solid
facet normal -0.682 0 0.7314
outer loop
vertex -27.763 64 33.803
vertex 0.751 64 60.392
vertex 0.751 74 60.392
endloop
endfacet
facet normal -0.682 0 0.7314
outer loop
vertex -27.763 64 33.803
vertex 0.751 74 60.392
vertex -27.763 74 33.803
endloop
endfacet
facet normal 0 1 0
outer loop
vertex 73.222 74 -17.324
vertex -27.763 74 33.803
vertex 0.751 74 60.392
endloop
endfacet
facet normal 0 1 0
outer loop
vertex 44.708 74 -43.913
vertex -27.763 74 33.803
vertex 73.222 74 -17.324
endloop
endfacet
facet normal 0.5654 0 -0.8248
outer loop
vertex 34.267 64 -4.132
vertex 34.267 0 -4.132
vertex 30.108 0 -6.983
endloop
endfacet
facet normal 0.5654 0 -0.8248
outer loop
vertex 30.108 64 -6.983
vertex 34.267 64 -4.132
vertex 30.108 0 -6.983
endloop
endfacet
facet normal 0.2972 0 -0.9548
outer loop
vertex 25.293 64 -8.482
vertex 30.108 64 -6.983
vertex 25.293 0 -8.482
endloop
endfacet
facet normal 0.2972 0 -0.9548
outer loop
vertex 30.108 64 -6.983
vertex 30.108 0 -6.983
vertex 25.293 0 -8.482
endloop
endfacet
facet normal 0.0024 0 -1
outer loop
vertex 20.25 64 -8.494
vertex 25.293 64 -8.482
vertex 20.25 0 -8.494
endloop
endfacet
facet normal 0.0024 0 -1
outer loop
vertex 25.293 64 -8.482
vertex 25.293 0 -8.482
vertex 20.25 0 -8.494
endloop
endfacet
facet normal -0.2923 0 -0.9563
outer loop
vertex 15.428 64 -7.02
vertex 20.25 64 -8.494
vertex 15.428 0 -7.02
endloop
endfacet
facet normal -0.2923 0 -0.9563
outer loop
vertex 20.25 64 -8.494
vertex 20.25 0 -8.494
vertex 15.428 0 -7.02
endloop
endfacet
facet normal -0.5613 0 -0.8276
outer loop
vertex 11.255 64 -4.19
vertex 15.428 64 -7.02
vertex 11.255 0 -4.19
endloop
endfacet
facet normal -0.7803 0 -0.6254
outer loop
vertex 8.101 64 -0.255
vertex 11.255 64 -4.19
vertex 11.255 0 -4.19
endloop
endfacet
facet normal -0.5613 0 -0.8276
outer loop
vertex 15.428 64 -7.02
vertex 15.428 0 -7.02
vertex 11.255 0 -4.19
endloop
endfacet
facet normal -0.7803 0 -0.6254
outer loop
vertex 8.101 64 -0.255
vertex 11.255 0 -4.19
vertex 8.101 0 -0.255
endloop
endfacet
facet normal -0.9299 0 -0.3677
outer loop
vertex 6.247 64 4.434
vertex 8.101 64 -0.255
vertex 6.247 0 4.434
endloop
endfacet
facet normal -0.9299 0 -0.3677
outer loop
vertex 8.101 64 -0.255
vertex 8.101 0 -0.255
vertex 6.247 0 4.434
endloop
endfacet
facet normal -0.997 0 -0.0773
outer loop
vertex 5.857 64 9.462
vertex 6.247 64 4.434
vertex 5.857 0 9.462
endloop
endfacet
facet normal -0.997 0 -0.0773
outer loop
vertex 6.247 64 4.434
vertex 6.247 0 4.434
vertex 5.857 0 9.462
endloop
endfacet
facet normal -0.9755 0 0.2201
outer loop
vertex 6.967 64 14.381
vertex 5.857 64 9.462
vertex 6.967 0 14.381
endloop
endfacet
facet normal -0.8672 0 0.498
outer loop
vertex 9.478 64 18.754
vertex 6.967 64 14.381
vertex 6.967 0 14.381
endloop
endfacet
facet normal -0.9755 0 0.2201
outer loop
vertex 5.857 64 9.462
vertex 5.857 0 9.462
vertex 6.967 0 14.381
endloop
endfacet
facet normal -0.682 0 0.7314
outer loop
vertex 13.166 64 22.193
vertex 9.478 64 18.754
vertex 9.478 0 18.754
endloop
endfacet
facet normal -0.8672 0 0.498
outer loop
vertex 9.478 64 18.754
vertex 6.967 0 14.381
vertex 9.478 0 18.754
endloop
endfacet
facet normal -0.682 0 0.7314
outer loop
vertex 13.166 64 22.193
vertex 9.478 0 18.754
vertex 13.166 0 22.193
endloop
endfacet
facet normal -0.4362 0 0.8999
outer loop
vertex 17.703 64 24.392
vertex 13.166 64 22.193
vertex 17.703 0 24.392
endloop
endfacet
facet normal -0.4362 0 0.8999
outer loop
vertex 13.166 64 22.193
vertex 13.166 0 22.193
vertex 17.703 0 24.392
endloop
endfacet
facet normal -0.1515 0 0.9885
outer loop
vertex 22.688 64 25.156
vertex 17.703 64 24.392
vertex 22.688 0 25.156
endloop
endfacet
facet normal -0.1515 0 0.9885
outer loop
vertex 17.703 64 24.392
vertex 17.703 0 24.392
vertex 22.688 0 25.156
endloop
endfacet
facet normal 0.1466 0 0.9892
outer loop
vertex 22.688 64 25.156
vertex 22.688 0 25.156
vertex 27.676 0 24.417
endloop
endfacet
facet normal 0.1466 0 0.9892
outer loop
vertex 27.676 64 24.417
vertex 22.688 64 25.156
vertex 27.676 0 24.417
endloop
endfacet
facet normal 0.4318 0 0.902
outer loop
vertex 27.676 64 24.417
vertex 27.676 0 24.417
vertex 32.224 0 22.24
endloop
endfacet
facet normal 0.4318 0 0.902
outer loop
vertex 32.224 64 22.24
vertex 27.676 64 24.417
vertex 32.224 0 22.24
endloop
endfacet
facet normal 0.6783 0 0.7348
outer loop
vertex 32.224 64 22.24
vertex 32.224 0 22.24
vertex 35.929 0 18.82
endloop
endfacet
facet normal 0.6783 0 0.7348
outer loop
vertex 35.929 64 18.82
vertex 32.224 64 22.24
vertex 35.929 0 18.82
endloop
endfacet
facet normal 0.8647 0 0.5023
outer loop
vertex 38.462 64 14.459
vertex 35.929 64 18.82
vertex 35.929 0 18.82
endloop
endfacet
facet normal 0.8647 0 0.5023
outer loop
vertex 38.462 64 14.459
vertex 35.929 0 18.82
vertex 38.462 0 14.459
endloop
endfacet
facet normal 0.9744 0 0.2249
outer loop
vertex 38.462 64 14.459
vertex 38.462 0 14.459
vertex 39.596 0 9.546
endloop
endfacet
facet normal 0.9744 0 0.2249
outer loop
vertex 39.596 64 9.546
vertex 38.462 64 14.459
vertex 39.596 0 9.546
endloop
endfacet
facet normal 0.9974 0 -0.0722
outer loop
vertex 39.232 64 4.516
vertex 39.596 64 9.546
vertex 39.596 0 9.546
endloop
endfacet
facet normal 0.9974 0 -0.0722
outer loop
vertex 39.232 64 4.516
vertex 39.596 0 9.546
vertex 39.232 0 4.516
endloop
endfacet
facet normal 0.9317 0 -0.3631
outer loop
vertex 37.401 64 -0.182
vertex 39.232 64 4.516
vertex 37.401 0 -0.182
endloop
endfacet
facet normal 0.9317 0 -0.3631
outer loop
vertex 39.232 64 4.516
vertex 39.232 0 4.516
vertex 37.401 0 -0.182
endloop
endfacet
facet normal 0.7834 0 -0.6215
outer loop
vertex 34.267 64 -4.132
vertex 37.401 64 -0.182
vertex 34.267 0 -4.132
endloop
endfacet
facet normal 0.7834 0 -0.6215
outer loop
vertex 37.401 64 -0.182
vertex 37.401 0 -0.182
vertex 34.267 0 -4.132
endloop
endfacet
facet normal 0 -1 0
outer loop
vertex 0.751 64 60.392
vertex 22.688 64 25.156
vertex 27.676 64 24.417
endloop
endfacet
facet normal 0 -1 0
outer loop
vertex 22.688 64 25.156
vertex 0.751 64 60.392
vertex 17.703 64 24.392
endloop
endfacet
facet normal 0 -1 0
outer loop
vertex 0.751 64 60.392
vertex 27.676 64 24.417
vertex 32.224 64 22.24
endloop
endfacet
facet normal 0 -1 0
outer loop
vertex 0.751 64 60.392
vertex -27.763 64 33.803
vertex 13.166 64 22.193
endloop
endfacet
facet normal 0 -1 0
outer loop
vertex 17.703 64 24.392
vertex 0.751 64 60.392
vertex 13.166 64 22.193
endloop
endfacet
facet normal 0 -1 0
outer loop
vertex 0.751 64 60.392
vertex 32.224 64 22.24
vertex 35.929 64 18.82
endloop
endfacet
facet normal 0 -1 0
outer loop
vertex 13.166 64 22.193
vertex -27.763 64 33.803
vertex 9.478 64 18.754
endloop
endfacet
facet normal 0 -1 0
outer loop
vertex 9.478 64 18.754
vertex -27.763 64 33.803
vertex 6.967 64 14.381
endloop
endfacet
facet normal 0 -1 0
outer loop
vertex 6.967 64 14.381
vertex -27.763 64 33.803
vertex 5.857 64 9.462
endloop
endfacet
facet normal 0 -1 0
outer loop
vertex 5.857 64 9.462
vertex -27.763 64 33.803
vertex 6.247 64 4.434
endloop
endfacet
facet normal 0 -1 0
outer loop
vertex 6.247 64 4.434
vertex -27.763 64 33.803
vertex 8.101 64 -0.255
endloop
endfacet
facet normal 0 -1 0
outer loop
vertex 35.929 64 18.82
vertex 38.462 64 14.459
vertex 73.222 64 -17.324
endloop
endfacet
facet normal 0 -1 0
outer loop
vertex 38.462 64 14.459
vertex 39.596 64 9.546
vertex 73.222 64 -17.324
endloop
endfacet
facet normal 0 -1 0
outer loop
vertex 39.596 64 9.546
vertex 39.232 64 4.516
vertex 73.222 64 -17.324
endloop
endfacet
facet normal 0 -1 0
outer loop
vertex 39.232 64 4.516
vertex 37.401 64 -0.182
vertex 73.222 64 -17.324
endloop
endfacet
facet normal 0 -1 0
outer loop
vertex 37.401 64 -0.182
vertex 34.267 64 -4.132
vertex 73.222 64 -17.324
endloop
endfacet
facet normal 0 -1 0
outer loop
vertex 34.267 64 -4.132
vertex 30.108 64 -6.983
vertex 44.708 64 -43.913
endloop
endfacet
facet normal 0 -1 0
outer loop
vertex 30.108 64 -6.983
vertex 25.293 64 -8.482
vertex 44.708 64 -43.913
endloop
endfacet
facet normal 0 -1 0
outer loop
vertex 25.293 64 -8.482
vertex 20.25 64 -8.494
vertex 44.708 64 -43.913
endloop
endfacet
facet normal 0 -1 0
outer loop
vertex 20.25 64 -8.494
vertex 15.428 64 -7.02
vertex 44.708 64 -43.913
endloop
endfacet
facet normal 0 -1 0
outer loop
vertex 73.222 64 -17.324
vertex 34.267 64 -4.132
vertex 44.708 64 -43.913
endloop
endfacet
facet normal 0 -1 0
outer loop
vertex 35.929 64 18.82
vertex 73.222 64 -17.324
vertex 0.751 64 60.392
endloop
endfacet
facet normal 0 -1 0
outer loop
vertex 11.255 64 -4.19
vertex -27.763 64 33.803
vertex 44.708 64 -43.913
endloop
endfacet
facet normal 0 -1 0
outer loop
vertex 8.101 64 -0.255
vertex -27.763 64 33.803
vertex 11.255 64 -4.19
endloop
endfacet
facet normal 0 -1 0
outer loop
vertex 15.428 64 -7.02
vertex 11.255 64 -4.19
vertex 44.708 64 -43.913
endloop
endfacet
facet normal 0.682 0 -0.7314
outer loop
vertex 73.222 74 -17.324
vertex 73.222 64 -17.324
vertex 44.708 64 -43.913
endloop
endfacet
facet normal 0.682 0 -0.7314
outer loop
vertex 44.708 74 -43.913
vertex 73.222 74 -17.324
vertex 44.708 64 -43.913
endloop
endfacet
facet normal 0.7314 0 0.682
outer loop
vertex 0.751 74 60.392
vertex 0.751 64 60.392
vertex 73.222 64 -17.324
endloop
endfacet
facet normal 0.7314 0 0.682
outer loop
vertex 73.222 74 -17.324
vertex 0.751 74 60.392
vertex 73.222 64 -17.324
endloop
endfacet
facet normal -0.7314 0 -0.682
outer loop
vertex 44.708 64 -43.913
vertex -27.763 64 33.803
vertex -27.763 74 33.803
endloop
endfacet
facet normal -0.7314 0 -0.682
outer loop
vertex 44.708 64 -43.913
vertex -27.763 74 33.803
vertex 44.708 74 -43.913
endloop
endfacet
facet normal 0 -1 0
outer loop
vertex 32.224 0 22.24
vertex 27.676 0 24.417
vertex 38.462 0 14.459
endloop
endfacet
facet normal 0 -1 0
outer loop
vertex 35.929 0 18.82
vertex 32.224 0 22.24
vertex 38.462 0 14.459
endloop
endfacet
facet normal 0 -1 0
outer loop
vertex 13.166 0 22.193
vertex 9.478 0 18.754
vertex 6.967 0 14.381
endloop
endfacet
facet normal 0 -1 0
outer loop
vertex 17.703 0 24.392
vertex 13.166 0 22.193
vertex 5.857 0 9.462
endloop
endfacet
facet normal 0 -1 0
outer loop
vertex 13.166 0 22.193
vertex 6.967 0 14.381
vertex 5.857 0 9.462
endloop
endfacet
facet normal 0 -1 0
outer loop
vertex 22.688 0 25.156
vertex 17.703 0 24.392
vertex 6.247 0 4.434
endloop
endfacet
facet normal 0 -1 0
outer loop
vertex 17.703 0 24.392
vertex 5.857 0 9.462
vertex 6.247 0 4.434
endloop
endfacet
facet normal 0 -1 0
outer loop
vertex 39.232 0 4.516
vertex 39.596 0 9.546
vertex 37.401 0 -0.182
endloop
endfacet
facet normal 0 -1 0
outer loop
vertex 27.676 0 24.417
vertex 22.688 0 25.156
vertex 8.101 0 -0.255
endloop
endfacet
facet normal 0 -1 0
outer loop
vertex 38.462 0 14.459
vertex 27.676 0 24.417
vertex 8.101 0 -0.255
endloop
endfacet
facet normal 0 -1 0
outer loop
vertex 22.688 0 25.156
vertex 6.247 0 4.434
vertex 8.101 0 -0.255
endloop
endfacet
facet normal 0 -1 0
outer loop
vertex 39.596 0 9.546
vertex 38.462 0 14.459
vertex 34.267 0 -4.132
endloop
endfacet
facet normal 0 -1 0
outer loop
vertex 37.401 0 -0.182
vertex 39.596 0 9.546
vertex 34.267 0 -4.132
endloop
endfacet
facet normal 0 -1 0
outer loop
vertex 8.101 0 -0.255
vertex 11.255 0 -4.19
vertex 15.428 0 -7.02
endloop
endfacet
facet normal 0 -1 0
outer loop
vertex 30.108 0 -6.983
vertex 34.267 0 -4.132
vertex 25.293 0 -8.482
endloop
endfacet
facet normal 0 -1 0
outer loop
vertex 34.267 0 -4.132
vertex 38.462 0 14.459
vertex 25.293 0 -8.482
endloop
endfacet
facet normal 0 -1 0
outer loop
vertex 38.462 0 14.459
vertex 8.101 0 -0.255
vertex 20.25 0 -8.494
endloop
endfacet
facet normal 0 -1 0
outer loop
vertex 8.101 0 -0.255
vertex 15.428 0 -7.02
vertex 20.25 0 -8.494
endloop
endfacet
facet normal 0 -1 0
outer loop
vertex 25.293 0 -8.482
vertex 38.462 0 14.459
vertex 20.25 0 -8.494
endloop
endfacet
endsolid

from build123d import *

# Parameters (mm, degrees)
SKETCH1_R             = 16.916621232
BOSS_EXTRUDE1_DEPTH   = 64
SKETCH2_W             = 106.262974488
SKETCH2_H             = 38.987679284
BOSS_EXTRUDE2_DEPTH   = 10
BODY_MOVE_COPY1_ANGLE = 47


with BuildPart() as part:
    # Sketch1 → Boss-Extrude1 (new body)
    with BuildSketch(Plane(origin=(0, 0, 0), x_dir=(1, 0, 0), z_dir=(0, 1, 0))):
        with Locations((22.72979363, -8.239550191)):
            Circle(SKETCH1_R)
    extrude(amount=BOSS_EXTRUDE1_DEPTH)

    # Sketch2 → Boss-Extrude2 (add)
    with BuildSketch(Plane(origin=(0, 64, 0), x_dir=(1, 0, 0), z_dir=(0, 1, 0))):
        with Locations((22.72979363, -8.239550191)):
            Rectangle(SKETCH2_W, SKETCH2_H)
    extrude(amount=BOSS_EXTRUDE2_DEPTH)


with BuildPart() as part_1:
    # Body-Move/Copy1: moved
    add(part.part.rotate(Axis((22.72979363, 0, 8.239550191), (0, 1, 0)), BODY_MOVE_COPY1_ANGLE))


solid = part_1.part
